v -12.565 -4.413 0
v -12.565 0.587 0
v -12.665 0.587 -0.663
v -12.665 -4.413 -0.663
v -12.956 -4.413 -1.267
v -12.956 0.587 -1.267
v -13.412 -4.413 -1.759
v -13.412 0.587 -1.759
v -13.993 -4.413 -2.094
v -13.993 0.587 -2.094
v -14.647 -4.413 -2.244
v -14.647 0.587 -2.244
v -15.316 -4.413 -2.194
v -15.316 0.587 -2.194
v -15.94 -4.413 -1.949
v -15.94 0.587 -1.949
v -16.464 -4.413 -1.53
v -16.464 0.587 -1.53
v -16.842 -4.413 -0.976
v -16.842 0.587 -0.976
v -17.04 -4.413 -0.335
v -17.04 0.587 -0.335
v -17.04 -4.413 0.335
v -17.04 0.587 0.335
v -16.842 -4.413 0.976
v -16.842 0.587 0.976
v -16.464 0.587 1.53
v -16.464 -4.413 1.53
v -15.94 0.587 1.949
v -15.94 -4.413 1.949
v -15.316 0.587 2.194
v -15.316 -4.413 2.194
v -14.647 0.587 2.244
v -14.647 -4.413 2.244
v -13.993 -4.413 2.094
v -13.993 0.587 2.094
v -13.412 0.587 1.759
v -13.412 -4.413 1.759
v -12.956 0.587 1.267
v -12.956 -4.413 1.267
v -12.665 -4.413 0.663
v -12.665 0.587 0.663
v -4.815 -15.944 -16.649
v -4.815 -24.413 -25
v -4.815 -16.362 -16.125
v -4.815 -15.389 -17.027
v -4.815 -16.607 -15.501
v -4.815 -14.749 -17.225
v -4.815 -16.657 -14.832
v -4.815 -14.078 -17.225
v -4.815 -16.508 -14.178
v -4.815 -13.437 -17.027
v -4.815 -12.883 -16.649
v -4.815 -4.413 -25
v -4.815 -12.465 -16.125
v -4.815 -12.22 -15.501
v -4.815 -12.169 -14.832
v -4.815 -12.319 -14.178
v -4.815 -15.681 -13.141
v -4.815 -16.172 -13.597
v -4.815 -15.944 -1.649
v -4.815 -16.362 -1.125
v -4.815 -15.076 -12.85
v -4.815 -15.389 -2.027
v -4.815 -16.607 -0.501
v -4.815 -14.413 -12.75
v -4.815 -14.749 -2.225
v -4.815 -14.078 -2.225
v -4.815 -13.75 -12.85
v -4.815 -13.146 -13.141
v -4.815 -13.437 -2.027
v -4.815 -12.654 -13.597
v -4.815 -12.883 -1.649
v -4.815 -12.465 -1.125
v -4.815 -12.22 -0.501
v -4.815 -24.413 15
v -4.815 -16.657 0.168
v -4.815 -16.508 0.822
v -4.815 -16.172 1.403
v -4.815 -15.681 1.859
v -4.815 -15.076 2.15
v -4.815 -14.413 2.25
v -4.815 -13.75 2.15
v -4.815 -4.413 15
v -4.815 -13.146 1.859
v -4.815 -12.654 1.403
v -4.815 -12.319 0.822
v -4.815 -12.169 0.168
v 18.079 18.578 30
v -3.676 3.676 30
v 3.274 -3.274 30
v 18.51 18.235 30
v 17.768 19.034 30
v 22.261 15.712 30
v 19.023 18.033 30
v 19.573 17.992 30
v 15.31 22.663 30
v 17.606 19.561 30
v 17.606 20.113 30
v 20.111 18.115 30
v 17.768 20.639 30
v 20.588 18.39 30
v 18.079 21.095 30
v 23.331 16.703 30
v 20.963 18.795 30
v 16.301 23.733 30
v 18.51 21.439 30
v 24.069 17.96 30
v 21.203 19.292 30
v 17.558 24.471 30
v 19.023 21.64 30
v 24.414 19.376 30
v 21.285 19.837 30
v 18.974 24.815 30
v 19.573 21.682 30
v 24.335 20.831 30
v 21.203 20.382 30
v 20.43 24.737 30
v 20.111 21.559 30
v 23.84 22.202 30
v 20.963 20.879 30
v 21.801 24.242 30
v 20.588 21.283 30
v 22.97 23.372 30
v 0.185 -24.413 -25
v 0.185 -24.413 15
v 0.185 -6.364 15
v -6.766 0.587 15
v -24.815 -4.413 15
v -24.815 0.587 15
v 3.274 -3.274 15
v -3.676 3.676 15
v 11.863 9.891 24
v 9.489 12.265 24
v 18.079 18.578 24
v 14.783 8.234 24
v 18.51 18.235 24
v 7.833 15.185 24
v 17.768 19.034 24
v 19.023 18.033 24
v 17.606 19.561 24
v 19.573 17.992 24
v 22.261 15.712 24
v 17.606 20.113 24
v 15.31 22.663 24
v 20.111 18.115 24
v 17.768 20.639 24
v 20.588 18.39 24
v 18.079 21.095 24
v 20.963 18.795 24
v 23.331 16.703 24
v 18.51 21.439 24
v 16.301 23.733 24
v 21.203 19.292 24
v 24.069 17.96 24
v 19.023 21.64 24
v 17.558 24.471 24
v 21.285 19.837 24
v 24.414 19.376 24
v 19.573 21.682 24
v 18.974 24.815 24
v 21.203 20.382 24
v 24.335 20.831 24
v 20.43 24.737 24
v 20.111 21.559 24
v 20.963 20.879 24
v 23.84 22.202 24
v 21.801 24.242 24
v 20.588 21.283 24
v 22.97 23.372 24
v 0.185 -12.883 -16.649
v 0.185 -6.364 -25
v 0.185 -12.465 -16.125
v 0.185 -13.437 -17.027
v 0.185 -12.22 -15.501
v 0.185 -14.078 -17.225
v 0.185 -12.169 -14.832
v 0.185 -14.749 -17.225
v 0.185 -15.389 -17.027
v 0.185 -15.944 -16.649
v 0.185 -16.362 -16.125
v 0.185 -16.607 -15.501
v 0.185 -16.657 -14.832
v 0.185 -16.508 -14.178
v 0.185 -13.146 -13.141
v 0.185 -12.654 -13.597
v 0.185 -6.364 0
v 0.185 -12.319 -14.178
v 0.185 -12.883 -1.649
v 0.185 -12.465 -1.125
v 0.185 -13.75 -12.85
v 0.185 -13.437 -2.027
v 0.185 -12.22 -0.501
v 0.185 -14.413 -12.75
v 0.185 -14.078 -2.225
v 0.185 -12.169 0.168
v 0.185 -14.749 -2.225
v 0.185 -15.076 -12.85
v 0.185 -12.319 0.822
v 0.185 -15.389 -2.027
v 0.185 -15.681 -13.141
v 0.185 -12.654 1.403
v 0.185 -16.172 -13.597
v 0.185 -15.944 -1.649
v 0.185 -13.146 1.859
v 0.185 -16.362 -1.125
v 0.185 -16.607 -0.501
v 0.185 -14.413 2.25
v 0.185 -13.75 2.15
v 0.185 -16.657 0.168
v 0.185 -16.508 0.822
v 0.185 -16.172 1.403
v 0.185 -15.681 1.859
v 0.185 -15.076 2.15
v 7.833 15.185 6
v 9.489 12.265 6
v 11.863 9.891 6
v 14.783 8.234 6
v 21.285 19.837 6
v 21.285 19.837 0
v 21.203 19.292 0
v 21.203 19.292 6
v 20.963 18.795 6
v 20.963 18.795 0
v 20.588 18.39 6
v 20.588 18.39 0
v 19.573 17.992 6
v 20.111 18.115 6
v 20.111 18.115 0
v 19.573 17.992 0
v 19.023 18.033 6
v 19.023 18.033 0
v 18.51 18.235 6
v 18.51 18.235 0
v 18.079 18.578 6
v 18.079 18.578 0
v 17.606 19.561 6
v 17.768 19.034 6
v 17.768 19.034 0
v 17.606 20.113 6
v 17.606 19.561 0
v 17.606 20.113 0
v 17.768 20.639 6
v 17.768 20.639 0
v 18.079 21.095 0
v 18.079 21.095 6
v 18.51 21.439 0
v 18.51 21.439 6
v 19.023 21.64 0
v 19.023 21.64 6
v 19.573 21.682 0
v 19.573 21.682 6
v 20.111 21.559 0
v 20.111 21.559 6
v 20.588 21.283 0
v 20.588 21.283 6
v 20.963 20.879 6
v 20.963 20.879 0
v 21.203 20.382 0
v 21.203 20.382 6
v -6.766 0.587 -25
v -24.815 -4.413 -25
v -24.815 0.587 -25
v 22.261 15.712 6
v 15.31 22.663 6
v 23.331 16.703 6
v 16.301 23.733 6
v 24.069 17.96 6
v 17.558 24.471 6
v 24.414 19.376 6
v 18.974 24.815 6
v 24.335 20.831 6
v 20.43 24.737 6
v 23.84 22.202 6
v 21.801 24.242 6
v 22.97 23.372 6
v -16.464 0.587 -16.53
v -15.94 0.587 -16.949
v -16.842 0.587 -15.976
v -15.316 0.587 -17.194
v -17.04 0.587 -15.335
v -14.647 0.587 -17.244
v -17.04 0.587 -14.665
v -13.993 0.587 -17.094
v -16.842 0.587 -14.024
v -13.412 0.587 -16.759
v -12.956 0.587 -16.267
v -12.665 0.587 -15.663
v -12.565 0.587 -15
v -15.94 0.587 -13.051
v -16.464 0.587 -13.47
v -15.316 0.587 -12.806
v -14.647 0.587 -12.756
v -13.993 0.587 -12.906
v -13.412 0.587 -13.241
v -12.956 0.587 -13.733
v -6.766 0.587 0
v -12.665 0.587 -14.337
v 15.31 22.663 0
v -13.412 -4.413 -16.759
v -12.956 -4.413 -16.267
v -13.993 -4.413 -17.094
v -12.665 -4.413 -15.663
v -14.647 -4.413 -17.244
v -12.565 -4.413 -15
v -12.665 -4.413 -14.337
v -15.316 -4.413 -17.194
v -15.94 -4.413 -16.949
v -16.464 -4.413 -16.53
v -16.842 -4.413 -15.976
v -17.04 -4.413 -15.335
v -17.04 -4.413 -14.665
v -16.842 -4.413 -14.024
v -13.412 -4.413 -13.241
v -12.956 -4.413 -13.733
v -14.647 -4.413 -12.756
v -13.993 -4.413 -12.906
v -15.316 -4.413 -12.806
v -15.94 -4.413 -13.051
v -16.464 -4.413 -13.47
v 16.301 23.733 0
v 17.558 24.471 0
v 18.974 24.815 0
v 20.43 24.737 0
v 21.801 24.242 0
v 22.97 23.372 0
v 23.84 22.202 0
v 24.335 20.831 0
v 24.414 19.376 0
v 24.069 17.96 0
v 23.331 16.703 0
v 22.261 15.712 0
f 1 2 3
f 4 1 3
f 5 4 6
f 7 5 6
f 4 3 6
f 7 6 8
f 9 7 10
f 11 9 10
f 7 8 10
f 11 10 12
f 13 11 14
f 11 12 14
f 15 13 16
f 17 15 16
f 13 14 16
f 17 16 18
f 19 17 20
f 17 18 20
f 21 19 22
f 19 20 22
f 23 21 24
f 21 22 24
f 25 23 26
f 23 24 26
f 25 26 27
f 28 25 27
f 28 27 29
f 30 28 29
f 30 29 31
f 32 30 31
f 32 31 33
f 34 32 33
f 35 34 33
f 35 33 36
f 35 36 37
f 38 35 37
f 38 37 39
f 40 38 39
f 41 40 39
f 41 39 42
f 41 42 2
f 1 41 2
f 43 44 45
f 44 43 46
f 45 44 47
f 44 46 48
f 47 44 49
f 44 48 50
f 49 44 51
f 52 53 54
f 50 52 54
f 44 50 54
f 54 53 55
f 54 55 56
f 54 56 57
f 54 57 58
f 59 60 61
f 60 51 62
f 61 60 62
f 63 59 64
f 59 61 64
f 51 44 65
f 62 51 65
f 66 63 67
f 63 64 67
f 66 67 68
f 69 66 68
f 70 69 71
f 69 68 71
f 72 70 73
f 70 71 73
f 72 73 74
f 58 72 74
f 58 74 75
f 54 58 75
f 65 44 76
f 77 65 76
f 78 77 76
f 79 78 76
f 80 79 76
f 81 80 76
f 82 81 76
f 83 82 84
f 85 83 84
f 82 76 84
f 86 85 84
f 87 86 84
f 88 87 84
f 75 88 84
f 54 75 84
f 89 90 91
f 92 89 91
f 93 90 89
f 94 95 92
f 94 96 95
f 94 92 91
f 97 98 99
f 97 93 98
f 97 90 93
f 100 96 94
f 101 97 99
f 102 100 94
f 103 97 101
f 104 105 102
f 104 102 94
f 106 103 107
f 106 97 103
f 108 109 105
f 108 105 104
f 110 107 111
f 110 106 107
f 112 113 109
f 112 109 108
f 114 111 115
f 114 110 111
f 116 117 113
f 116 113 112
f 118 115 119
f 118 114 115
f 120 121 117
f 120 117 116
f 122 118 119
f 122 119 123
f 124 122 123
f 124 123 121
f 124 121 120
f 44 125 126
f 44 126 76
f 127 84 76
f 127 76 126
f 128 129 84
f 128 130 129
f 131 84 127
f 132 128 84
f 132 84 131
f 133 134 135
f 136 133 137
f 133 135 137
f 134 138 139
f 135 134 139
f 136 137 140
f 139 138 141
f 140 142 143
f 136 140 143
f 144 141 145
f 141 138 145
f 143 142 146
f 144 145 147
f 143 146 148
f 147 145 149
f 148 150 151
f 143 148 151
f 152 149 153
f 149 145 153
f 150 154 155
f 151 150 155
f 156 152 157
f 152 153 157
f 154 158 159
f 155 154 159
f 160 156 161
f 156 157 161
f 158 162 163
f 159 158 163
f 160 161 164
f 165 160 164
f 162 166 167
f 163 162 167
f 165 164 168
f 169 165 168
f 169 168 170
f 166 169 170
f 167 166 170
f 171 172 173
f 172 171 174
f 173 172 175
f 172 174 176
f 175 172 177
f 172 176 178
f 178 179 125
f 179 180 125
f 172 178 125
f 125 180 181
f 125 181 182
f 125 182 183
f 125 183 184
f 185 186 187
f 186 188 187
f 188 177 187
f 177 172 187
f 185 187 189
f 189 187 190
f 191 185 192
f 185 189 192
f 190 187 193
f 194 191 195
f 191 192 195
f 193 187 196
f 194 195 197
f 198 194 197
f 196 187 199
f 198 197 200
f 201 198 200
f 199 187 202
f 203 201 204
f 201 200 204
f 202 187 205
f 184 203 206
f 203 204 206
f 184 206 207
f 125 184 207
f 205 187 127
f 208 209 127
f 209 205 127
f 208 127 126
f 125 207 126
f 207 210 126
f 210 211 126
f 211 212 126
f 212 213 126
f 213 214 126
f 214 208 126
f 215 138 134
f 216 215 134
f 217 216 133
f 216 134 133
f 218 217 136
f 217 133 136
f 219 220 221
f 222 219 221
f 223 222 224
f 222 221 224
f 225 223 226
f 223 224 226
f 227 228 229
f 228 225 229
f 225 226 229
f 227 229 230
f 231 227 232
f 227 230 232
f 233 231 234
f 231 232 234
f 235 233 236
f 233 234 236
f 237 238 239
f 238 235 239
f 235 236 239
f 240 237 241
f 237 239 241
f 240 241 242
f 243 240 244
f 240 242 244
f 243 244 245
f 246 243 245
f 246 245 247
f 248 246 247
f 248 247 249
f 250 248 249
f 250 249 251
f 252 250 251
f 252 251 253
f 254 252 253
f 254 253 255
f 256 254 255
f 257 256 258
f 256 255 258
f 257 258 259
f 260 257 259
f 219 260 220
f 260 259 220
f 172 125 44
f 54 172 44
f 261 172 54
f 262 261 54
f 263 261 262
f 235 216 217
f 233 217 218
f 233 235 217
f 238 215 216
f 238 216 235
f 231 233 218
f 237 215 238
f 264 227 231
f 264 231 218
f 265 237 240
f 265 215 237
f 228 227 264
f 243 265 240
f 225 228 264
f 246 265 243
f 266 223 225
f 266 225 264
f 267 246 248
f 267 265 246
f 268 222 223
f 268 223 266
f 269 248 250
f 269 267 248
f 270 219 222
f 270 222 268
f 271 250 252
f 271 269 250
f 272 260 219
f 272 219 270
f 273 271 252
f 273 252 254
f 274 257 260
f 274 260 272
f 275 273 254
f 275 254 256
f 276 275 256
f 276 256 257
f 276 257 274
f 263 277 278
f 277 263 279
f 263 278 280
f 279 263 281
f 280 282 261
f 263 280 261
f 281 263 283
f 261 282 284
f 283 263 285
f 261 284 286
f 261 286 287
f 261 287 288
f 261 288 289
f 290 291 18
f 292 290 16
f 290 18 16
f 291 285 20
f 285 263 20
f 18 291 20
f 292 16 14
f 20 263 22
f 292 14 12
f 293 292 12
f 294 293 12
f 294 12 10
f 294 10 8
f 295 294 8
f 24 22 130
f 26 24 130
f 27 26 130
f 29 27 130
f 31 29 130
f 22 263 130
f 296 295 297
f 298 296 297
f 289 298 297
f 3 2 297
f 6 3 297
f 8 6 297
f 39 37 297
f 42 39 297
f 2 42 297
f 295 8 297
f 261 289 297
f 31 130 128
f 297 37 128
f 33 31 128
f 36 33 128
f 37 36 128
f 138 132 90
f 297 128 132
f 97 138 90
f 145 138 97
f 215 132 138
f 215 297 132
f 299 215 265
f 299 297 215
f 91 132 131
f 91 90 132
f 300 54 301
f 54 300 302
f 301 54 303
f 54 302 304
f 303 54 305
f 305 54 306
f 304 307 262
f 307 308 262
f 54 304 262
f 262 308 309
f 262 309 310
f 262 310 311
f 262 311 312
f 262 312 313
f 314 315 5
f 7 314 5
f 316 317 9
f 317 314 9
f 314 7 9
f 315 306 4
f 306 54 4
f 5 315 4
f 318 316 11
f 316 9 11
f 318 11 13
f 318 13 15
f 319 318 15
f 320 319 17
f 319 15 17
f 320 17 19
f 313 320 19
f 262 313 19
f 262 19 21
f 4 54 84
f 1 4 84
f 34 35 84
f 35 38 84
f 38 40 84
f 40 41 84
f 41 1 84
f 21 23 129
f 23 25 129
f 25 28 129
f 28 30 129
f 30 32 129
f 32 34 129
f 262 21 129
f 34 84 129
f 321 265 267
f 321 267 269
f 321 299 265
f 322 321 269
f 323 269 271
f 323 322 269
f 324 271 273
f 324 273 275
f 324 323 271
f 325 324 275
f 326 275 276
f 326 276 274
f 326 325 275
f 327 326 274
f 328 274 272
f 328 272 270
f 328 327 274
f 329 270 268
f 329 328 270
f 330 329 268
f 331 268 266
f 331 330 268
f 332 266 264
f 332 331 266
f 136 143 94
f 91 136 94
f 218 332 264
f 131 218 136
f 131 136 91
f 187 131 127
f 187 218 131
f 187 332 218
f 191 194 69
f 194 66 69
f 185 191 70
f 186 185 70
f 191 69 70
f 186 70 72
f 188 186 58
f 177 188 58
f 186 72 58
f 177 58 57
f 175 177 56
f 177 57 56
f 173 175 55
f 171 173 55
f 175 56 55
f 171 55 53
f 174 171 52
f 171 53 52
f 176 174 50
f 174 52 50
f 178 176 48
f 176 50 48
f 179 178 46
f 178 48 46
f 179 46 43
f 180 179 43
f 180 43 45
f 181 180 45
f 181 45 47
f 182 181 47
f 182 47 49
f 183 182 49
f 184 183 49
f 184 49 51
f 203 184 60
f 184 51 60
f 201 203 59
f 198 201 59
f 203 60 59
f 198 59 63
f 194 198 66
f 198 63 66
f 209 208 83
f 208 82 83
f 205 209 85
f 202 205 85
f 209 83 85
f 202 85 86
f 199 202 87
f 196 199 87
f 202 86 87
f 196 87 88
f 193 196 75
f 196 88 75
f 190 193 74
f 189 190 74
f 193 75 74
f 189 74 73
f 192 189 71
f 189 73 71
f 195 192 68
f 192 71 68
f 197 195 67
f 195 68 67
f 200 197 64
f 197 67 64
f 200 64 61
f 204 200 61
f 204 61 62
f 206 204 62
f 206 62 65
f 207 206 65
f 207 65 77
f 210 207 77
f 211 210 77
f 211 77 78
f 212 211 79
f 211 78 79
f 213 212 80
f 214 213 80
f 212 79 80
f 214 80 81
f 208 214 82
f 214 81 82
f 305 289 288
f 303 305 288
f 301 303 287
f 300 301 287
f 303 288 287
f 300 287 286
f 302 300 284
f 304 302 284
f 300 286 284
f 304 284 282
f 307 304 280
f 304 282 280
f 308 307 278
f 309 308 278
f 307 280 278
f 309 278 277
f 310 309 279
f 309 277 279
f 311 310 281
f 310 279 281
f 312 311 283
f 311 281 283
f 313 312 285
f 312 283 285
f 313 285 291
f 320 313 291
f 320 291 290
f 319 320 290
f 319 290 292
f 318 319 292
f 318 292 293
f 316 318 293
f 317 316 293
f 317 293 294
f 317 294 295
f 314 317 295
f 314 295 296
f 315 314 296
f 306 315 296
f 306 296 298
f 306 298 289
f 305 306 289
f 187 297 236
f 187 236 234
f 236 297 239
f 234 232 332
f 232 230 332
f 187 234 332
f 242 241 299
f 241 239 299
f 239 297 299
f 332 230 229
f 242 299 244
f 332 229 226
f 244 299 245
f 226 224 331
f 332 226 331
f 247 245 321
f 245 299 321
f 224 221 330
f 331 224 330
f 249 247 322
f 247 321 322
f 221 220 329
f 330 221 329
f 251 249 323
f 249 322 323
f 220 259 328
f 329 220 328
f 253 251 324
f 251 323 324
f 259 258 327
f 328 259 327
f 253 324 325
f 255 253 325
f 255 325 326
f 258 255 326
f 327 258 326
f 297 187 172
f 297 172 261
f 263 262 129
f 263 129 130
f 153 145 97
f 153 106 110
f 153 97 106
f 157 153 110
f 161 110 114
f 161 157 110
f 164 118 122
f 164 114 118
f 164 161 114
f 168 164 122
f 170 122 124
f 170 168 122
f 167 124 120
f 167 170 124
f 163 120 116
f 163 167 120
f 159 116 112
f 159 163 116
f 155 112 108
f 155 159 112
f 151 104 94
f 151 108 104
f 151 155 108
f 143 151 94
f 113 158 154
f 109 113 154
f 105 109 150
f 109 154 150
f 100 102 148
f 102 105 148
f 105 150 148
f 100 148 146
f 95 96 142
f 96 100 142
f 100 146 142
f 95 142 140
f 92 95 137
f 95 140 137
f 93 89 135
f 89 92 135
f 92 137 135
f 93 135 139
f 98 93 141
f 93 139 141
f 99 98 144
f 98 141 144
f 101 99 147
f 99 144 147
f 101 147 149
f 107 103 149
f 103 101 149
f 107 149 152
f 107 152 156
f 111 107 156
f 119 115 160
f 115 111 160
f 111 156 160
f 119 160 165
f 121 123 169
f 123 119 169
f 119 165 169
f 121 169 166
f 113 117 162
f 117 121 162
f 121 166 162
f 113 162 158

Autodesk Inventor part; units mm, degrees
ref_plane "YZ Plane" through (0, 0, 0) normal (1, 0, 0) x (0, 1, 0)
ref_plane "XZ Plane" through (0, 0, 0) normal (0, 1, 0) x (-1, 0, 0)
ref_plane "XY Plane" through (0, 0, 0) normal (0, 0, 1) x (1, 0, 0)
sketch "Sketch1" plane through (0, 0, 0) normal (0, 0, 1) x (1, 0, 0)
  line L0 (-6.766, 0.5868) -> (-24.8151, 0.5868)
  line L1 (-24.8151, 0.5868) -> (-24.8151, -4.4132)
  line L2 (-24.8151, -4.4132) -> (-4.8151, -4.4132)
  line L3 (-4.8151, -4.4132) -> (-4.8151, -24.4132)
  line L4 (-4.8151, -24.4132) -> (0.1849, -24.4132)
  line L5 (0.1849, -24.4132) -> (0.1849, -6.3641)
  line L6 (-6.766, 0.5868) -> (15.3105, 22.6633)
  line L7 (22.2614, 15.7124) -> (0.1849, -6.3641)
  circle A0 centre (19.4349, 19.8368) radius 1.85
  arc A1 (22.2614, 15.7124) -> (15.3105, 22.6633) centre (19.4349, 19.8368) ccw
  dimension "d0" = 20
  dimension "d1" = 20
  dimension "d2" = 5
  dimension "d3" = 5
  dimension "d7" = 24.25
  dimension "d8" = 24.25
  dimension "d9" = 3.7
  dimension "d18" = 5
  dimension "d19" = 135
extrude "Extrusion1" add sketch "Sketch1" along normal blind 30
ref_plane "Work Plane1" through (0, 0, 24) normal (0, 0, 1) x (1, 0, 0)
sketch "Sketch3" plane through (0, 0, 24) normal (0, 0, 1) x (1, 0, 0)
  circle A0 centre (19.4349, 19.8368) radius 1.85 projected
  circle A1 centre (19.4349, 19.8368) radius 12.5
  point P0 (0, 0)
  dimension "d13" = 25
extrude "Extrusion3" cut sketch "Sketch3" against normal blind 18
sketch "Sketch5" plane through (0, 0, 0) normal (0, 0, -1) x (-1, 0, 0)
  circle A0 centre (-19.4349, 19.8368) radius 1.85 projected
  line L0 (24.8151, -4.4132) -> (24.8151, 0.5868) projected
  line L1 (24.8151, 0.5868) -> (6.766, 0.5868) projected
  line L2 (6.766, 0.5868) -> (-15.3105, 22.6633) projected
  arc A1 (-15.3105, 22.6633) -> (-22.2614, 15.7124) centre (-19.4349, 19.8368) ccw projected
  line L3 (-22.2614, 15.7124) -> (-0.1849, -6.3641) projected
  line L4 (-0.1849, -6.3641) -> (-0.1849, -24.4132) projected
  line L5 (-0.1849, -24.4132) -> (4.8151, -24.4132) projected
  line L6 (4.8151, -24.4132) -> (4.8151, -4.4132) projected
  line L7 (4.8151, -4.4132) -> (24.8151, -4.4132) projected
  line L8 (-0.1849, -6.3641) -> (6.766, 0.5868)
  point P0 (0, 0)
extrude "Extrusion5" add sketch "Sketch5" along normal blind 25 contours L7 L6 L5 L4 L8 L1 L0
sketch "Sketch8" plane through (-4.8151, -24.4132, -25) normal (-1, 0, 0) x (0, 0, 1)
  circle A0 centre (10, 10) radius 2.25
  line L0 (55, 0) -> (0, 0) projected
  line L1 (0, 0) -> (0, 20) projected
  circle A1 centre (25, 10) radius 2.25
  point P0 (25, 24.4132)
  dimension "d40" = 4.5
  dimension "d41" = 10
  dimension "d42" = 10
  dimension "d43" = 4.5
  dimension "d44" = 10
  dimension "d45" = 15
sketch "Sketch9" plane through (-24.8151, 0.5868, 30) normal (0, 1, 0) x (1, 0, 0)
  circle A0 centre (10, 45) radius 2.25
  circle A1 centre (10, 30) radius 2.25
  line L0 (0, 55) -> (18.0491, 55) projected
  line L1 (0, 0) -> (0, 55) projected
  point P0 (24.8151, 30)
  dimension "d46" = 10
  dimension "d47" = 10
  dimension "d48" = 10
  dimension "d49" = 15
  dimension "d50" = 4.5
  dimension "d51" = 4.5
extrude "Extrusion8" cut sketch "Sketch9" against normal mid plane 20
extrude "Extrusion9" cut sketch "Sketch8" against normal blind 20
sketch "Sketch10" plane through (0, 0, 30) normal (0, 0, 1) x (1, 0, 0)
  line L0 (-3.9108, 3.9108) -> (4.5333, -4.5333)
  line L1 (4.5333, -4.5333) -> (4.5333, -31.01)
  line L2 (4.5333, -31.01) -> (-28.169, -31.01)
  line L3 (-28.169, -31.01) -> (-28.169, 3.9108)
  line L4 (-28.169, 3.9108) -> (-3.9108, 3.9108)
  point P0 (0, 0)
  dimension "d56" = 135
  dimension "d57" = 0
extrude "Extrusion10" cut sketch "Sketch10" against normal blind 15
equation "\"d8\" = d7"
equation "\"d43\" = d40"
equation "\"d44\" = d41"
equation "\"RodDiameter\" = 8"
equation "\"VerticalBearingOD\" = 16"
equation "\"PrintingClearance\" = 0.2"
equation "\"TubeID\" = 18"
properties part number "PulleyHolderXY"
